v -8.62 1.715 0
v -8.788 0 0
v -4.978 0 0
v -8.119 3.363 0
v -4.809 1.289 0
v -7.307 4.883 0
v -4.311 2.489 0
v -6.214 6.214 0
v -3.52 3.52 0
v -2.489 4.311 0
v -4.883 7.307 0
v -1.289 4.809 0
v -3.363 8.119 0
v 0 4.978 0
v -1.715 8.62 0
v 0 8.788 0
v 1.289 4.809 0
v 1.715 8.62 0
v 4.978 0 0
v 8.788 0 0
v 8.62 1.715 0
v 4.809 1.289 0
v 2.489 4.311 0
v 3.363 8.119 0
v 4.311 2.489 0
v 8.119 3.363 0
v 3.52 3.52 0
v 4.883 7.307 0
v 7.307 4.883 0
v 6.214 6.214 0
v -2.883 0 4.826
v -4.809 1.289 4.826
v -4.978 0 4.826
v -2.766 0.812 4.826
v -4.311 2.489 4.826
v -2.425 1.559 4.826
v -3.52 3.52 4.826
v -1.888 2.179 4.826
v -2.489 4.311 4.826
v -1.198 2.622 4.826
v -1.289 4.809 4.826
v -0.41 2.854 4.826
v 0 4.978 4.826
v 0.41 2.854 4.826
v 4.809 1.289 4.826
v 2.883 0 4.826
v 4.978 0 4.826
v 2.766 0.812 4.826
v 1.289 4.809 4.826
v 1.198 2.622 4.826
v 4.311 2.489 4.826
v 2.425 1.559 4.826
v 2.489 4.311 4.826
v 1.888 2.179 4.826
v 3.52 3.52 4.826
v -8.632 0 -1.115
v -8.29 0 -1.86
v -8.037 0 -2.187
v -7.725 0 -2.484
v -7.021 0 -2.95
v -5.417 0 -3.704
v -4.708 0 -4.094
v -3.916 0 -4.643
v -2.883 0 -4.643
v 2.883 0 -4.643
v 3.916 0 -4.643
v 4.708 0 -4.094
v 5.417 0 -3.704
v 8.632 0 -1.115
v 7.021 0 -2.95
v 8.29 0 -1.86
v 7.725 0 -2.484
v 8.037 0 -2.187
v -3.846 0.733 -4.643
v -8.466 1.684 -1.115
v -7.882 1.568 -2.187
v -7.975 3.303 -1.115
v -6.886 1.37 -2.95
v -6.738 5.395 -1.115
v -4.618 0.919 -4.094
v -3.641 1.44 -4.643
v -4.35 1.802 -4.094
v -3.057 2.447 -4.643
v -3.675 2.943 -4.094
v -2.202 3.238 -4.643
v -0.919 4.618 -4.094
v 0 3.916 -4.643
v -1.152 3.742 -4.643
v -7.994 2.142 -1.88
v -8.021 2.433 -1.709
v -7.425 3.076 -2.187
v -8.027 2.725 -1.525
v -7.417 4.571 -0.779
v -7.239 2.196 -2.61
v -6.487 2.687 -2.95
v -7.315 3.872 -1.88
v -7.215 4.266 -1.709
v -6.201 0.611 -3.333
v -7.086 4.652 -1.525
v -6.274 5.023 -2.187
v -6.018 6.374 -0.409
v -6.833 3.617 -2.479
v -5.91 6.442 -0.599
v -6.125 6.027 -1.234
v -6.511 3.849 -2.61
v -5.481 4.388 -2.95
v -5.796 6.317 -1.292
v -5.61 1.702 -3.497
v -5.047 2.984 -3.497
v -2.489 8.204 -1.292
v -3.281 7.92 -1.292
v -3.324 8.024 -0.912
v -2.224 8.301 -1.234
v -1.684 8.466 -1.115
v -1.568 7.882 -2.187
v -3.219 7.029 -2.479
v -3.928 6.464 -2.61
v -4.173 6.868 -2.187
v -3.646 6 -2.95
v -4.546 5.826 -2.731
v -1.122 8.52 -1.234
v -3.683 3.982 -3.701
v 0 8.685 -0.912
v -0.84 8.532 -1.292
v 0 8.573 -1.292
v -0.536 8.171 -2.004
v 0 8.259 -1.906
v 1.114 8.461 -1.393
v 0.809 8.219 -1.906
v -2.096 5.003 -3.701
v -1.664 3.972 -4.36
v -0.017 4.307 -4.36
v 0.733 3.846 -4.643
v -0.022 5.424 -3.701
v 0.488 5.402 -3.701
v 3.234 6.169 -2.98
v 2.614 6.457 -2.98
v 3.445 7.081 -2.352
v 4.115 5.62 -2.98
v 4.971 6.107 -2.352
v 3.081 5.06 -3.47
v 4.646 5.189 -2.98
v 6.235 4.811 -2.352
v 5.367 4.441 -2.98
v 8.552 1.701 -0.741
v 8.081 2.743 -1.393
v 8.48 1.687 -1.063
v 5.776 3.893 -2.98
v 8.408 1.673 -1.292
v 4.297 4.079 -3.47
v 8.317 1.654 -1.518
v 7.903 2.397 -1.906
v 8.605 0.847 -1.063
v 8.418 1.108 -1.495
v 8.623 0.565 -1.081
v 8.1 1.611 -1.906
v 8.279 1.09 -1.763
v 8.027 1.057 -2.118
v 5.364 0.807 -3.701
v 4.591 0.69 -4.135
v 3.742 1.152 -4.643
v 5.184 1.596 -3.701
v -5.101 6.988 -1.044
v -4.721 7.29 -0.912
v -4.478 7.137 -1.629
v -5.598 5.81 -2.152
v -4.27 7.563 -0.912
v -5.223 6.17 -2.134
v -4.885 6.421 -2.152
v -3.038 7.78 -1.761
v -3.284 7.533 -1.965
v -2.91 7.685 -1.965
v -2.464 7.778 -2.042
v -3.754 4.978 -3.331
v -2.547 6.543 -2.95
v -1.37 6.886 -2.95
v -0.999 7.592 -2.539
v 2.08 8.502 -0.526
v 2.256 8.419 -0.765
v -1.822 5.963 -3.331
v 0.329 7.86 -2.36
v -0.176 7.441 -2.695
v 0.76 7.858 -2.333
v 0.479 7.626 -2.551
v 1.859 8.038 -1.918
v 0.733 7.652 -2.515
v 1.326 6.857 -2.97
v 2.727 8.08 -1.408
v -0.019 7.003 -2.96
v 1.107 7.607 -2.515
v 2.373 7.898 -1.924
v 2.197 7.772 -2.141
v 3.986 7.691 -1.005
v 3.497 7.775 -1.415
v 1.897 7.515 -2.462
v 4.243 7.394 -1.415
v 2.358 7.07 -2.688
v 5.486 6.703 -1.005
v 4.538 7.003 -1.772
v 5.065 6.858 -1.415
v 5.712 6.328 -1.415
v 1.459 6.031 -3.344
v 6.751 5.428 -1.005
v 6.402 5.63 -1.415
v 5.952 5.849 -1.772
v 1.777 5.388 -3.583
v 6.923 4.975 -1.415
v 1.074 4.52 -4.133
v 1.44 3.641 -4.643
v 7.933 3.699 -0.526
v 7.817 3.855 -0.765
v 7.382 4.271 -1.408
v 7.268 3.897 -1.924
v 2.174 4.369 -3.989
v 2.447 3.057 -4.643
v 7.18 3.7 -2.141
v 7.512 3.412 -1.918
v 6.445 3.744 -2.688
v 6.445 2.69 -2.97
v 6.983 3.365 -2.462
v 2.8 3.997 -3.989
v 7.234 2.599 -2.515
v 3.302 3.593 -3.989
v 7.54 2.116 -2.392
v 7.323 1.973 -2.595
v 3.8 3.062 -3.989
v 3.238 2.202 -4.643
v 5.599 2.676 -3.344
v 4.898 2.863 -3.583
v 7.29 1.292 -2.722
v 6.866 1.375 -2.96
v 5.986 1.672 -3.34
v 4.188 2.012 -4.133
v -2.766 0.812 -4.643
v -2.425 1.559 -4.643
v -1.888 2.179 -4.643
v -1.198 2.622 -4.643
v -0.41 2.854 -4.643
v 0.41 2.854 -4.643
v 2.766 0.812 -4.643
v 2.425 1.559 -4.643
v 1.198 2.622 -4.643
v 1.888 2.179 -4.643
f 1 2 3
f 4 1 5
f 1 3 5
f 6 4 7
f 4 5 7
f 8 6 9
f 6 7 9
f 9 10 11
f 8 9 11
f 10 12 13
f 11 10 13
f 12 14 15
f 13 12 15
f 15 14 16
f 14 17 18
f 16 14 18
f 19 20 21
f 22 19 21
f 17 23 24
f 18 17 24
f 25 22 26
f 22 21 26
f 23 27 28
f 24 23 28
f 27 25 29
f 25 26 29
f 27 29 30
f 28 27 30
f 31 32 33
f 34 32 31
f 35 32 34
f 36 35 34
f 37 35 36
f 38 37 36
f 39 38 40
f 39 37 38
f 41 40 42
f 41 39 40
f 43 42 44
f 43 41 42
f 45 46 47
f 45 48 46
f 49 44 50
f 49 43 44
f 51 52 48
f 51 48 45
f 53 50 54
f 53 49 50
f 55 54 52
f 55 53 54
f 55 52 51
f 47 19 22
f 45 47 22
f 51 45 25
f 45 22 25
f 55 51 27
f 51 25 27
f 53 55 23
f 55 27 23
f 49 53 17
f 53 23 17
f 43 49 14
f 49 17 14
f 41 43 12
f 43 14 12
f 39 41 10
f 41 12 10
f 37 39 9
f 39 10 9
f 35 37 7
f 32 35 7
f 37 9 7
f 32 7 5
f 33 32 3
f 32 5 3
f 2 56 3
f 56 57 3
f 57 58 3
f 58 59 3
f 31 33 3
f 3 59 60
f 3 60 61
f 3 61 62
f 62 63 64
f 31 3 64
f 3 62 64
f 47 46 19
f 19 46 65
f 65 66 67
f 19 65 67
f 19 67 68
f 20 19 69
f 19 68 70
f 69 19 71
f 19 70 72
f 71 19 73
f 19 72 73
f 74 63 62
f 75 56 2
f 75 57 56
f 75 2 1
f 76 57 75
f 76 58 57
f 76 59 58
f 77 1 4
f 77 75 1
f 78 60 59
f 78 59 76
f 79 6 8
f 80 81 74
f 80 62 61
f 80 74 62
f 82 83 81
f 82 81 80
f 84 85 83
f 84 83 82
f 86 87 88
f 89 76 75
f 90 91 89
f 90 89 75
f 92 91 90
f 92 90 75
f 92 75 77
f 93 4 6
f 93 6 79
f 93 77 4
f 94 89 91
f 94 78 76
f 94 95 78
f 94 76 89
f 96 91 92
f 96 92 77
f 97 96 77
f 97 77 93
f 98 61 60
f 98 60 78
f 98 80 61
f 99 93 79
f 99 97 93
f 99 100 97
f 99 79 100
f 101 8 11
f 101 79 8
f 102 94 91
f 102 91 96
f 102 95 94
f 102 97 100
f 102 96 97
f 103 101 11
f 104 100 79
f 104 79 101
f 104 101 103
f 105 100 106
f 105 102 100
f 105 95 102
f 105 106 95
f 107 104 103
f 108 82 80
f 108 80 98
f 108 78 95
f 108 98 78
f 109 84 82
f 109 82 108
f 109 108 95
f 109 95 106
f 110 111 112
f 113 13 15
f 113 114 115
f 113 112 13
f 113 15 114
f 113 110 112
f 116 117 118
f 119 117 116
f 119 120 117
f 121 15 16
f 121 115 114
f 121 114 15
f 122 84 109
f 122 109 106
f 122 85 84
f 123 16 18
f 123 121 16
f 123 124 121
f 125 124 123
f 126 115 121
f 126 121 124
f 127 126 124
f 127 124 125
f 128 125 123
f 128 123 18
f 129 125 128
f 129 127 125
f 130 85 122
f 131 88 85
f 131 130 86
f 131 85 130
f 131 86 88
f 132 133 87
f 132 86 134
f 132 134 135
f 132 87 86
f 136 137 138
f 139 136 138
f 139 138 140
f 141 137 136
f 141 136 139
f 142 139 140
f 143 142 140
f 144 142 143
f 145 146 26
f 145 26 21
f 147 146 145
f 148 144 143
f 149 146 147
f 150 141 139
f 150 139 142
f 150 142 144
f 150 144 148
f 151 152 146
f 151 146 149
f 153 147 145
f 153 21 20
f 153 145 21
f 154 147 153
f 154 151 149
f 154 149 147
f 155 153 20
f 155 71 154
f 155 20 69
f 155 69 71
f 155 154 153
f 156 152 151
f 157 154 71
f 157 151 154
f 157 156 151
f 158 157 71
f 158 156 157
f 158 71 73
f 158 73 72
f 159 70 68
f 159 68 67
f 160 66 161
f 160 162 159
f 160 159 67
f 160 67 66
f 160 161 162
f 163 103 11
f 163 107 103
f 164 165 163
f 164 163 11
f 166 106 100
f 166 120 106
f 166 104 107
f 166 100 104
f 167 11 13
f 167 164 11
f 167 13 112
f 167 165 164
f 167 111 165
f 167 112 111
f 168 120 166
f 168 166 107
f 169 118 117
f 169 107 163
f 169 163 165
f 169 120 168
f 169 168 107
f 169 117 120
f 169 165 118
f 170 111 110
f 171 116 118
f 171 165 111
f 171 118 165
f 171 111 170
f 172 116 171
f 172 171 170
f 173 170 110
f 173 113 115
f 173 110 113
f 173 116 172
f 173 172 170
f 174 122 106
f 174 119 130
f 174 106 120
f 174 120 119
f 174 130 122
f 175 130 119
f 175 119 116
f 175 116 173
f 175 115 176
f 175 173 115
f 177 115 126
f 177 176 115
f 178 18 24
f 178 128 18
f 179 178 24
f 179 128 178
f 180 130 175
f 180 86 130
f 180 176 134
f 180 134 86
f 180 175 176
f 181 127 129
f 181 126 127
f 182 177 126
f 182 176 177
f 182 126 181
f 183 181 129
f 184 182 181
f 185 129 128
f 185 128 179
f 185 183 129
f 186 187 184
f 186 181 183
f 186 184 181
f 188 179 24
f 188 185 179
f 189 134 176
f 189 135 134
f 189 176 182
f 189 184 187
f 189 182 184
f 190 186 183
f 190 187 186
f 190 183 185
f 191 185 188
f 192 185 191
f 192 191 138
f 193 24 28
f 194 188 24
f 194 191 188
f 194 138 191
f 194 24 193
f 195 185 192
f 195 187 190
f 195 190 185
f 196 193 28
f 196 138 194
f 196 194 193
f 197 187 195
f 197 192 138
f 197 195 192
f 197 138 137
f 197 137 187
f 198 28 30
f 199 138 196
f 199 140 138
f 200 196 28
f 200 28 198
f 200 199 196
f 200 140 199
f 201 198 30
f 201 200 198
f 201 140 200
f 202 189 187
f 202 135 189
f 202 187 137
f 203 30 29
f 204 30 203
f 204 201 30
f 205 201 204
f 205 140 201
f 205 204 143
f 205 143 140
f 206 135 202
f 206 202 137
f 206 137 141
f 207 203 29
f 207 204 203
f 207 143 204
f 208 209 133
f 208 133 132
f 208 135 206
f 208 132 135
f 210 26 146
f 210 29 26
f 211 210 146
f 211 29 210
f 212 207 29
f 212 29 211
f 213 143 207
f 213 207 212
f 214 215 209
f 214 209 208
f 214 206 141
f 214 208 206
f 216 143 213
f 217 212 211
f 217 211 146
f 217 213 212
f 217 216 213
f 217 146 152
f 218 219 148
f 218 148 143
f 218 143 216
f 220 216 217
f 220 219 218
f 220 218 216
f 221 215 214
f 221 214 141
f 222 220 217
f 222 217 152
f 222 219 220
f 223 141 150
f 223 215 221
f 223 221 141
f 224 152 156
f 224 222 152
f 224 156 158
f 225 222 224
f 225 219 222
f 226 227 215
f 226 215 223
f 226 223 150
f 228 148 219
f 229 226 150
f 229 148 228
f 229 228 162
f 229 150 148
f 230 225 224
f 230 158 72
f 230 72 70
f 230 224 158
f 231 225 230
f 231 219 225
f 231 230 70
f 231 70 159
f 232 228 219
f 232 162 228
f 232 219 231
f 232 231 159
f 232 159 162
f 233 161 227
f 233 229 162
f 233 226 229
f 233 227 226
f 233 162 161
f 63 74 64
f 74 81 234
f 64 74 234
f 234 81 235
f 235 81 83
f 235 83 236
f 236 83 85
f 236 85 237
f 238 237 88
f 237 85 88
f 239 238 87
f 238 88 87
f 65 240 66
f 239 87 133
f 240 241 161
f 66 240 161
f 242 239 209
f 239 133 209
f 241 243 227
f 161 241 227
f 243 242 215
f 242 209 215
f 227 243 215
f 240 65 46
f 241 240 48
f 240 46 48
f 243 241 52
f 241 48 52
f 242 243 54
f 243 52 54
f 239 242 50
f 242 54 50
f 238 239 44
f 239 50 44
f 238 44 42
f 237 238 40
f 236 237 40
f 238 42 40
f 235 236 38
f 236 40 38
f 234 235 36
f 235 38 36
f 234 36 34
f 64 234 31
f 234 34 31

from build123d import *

# Parameters (mm, degrees)
SKETCH1_R               = 4.9784
BOSS_EXTRUDE1_DEPTH     = 4.826
SKETCH2_R               = 2.8829
CUT_EXTRUDE1_DEPTH      = 5.826
CUT_EXTRUDE1_DEPTH_BACK = 7.359654759
SKETCH5_R               = 6.35
CUT_EXTRUDE4_DEPTH      = 0.762
SKETCH8_W               = 25.4
SKETCH8_H               = 25.4
CUT_EXTRUDE5_DEPTH      = 9.7884001


with BuildPart() as part:
    # Sketch1 → Boss-Extrude1 (new body)
    with BuildSketch(Plane.XY):
        Circle(SKETCH1_R)
    extrude(amount=BOSS_EXTRUDE1_DEPTH)

    # Sketch3 → Revolve1 (revolve)
    with BuildSketch(Plane(origin=(0, 0, 0), x_dir=(0, 0, -1), z_dir=(1, 0, 0))):
        with BuildLine():
            Line((0, 0), (6.35, 0))
            add(Edge.make_bspline(
                [(0, 8.7884), (2.795464345, 8.743912966), (3.194527454, 4.557229334), (6.50039289, 2.137437451), (6.35, 0)],
                knots=[0, 0, 0, 0, 0.503113521, 1, 1, 1, 1], degree=3))
            Line((0, 8.7884), (0, 4.9784))
            Line((0, 4.9784), (0, 0))
        make_face()
    revolve(axis=Axis((0, 0, 0), (0, 0, -1)))

    # Sketch2 → Cut-Extrude1 (cut, two sides)
    with BuildSketch(Plane.XY) as cut_extrude1_sk:
        Circle(SKETCH2_R)
    extrude(amount=CUT_EXTRUDE1_DEPTH, mode=Mode.SUBTRACT)
    extrude(cut_extrude1_sk.sketch, amount=-CUT_EXTRUDE1_DEPTH_BACK, mode=Mode.SUBTRACT)

    # Sketch5 → Cut-Extrude4 (cut)
    with BuildSketch(Plane.XY.offset(-5.404994532)):
        Circle(SKETCH5_R)
    extrude(amount=CUT_EXTRUDE4_DEPTH, mode=Mode.SUBTRACT)

    # Sketch8 → Cut-Extrude5 (cut, through all)
    with BuildSketch(Plane(origin=(0, 0, 0), x_dir=(1, 0, 0), z_dir=(0, 1, 0))):
        Rectangle(SKETCH8_W, SKETCH8_H)
    extrude(amount=-CUT_EXTRUDE5_DEPTH, mode=Mode.SUBTRACT)


solid = part.part
